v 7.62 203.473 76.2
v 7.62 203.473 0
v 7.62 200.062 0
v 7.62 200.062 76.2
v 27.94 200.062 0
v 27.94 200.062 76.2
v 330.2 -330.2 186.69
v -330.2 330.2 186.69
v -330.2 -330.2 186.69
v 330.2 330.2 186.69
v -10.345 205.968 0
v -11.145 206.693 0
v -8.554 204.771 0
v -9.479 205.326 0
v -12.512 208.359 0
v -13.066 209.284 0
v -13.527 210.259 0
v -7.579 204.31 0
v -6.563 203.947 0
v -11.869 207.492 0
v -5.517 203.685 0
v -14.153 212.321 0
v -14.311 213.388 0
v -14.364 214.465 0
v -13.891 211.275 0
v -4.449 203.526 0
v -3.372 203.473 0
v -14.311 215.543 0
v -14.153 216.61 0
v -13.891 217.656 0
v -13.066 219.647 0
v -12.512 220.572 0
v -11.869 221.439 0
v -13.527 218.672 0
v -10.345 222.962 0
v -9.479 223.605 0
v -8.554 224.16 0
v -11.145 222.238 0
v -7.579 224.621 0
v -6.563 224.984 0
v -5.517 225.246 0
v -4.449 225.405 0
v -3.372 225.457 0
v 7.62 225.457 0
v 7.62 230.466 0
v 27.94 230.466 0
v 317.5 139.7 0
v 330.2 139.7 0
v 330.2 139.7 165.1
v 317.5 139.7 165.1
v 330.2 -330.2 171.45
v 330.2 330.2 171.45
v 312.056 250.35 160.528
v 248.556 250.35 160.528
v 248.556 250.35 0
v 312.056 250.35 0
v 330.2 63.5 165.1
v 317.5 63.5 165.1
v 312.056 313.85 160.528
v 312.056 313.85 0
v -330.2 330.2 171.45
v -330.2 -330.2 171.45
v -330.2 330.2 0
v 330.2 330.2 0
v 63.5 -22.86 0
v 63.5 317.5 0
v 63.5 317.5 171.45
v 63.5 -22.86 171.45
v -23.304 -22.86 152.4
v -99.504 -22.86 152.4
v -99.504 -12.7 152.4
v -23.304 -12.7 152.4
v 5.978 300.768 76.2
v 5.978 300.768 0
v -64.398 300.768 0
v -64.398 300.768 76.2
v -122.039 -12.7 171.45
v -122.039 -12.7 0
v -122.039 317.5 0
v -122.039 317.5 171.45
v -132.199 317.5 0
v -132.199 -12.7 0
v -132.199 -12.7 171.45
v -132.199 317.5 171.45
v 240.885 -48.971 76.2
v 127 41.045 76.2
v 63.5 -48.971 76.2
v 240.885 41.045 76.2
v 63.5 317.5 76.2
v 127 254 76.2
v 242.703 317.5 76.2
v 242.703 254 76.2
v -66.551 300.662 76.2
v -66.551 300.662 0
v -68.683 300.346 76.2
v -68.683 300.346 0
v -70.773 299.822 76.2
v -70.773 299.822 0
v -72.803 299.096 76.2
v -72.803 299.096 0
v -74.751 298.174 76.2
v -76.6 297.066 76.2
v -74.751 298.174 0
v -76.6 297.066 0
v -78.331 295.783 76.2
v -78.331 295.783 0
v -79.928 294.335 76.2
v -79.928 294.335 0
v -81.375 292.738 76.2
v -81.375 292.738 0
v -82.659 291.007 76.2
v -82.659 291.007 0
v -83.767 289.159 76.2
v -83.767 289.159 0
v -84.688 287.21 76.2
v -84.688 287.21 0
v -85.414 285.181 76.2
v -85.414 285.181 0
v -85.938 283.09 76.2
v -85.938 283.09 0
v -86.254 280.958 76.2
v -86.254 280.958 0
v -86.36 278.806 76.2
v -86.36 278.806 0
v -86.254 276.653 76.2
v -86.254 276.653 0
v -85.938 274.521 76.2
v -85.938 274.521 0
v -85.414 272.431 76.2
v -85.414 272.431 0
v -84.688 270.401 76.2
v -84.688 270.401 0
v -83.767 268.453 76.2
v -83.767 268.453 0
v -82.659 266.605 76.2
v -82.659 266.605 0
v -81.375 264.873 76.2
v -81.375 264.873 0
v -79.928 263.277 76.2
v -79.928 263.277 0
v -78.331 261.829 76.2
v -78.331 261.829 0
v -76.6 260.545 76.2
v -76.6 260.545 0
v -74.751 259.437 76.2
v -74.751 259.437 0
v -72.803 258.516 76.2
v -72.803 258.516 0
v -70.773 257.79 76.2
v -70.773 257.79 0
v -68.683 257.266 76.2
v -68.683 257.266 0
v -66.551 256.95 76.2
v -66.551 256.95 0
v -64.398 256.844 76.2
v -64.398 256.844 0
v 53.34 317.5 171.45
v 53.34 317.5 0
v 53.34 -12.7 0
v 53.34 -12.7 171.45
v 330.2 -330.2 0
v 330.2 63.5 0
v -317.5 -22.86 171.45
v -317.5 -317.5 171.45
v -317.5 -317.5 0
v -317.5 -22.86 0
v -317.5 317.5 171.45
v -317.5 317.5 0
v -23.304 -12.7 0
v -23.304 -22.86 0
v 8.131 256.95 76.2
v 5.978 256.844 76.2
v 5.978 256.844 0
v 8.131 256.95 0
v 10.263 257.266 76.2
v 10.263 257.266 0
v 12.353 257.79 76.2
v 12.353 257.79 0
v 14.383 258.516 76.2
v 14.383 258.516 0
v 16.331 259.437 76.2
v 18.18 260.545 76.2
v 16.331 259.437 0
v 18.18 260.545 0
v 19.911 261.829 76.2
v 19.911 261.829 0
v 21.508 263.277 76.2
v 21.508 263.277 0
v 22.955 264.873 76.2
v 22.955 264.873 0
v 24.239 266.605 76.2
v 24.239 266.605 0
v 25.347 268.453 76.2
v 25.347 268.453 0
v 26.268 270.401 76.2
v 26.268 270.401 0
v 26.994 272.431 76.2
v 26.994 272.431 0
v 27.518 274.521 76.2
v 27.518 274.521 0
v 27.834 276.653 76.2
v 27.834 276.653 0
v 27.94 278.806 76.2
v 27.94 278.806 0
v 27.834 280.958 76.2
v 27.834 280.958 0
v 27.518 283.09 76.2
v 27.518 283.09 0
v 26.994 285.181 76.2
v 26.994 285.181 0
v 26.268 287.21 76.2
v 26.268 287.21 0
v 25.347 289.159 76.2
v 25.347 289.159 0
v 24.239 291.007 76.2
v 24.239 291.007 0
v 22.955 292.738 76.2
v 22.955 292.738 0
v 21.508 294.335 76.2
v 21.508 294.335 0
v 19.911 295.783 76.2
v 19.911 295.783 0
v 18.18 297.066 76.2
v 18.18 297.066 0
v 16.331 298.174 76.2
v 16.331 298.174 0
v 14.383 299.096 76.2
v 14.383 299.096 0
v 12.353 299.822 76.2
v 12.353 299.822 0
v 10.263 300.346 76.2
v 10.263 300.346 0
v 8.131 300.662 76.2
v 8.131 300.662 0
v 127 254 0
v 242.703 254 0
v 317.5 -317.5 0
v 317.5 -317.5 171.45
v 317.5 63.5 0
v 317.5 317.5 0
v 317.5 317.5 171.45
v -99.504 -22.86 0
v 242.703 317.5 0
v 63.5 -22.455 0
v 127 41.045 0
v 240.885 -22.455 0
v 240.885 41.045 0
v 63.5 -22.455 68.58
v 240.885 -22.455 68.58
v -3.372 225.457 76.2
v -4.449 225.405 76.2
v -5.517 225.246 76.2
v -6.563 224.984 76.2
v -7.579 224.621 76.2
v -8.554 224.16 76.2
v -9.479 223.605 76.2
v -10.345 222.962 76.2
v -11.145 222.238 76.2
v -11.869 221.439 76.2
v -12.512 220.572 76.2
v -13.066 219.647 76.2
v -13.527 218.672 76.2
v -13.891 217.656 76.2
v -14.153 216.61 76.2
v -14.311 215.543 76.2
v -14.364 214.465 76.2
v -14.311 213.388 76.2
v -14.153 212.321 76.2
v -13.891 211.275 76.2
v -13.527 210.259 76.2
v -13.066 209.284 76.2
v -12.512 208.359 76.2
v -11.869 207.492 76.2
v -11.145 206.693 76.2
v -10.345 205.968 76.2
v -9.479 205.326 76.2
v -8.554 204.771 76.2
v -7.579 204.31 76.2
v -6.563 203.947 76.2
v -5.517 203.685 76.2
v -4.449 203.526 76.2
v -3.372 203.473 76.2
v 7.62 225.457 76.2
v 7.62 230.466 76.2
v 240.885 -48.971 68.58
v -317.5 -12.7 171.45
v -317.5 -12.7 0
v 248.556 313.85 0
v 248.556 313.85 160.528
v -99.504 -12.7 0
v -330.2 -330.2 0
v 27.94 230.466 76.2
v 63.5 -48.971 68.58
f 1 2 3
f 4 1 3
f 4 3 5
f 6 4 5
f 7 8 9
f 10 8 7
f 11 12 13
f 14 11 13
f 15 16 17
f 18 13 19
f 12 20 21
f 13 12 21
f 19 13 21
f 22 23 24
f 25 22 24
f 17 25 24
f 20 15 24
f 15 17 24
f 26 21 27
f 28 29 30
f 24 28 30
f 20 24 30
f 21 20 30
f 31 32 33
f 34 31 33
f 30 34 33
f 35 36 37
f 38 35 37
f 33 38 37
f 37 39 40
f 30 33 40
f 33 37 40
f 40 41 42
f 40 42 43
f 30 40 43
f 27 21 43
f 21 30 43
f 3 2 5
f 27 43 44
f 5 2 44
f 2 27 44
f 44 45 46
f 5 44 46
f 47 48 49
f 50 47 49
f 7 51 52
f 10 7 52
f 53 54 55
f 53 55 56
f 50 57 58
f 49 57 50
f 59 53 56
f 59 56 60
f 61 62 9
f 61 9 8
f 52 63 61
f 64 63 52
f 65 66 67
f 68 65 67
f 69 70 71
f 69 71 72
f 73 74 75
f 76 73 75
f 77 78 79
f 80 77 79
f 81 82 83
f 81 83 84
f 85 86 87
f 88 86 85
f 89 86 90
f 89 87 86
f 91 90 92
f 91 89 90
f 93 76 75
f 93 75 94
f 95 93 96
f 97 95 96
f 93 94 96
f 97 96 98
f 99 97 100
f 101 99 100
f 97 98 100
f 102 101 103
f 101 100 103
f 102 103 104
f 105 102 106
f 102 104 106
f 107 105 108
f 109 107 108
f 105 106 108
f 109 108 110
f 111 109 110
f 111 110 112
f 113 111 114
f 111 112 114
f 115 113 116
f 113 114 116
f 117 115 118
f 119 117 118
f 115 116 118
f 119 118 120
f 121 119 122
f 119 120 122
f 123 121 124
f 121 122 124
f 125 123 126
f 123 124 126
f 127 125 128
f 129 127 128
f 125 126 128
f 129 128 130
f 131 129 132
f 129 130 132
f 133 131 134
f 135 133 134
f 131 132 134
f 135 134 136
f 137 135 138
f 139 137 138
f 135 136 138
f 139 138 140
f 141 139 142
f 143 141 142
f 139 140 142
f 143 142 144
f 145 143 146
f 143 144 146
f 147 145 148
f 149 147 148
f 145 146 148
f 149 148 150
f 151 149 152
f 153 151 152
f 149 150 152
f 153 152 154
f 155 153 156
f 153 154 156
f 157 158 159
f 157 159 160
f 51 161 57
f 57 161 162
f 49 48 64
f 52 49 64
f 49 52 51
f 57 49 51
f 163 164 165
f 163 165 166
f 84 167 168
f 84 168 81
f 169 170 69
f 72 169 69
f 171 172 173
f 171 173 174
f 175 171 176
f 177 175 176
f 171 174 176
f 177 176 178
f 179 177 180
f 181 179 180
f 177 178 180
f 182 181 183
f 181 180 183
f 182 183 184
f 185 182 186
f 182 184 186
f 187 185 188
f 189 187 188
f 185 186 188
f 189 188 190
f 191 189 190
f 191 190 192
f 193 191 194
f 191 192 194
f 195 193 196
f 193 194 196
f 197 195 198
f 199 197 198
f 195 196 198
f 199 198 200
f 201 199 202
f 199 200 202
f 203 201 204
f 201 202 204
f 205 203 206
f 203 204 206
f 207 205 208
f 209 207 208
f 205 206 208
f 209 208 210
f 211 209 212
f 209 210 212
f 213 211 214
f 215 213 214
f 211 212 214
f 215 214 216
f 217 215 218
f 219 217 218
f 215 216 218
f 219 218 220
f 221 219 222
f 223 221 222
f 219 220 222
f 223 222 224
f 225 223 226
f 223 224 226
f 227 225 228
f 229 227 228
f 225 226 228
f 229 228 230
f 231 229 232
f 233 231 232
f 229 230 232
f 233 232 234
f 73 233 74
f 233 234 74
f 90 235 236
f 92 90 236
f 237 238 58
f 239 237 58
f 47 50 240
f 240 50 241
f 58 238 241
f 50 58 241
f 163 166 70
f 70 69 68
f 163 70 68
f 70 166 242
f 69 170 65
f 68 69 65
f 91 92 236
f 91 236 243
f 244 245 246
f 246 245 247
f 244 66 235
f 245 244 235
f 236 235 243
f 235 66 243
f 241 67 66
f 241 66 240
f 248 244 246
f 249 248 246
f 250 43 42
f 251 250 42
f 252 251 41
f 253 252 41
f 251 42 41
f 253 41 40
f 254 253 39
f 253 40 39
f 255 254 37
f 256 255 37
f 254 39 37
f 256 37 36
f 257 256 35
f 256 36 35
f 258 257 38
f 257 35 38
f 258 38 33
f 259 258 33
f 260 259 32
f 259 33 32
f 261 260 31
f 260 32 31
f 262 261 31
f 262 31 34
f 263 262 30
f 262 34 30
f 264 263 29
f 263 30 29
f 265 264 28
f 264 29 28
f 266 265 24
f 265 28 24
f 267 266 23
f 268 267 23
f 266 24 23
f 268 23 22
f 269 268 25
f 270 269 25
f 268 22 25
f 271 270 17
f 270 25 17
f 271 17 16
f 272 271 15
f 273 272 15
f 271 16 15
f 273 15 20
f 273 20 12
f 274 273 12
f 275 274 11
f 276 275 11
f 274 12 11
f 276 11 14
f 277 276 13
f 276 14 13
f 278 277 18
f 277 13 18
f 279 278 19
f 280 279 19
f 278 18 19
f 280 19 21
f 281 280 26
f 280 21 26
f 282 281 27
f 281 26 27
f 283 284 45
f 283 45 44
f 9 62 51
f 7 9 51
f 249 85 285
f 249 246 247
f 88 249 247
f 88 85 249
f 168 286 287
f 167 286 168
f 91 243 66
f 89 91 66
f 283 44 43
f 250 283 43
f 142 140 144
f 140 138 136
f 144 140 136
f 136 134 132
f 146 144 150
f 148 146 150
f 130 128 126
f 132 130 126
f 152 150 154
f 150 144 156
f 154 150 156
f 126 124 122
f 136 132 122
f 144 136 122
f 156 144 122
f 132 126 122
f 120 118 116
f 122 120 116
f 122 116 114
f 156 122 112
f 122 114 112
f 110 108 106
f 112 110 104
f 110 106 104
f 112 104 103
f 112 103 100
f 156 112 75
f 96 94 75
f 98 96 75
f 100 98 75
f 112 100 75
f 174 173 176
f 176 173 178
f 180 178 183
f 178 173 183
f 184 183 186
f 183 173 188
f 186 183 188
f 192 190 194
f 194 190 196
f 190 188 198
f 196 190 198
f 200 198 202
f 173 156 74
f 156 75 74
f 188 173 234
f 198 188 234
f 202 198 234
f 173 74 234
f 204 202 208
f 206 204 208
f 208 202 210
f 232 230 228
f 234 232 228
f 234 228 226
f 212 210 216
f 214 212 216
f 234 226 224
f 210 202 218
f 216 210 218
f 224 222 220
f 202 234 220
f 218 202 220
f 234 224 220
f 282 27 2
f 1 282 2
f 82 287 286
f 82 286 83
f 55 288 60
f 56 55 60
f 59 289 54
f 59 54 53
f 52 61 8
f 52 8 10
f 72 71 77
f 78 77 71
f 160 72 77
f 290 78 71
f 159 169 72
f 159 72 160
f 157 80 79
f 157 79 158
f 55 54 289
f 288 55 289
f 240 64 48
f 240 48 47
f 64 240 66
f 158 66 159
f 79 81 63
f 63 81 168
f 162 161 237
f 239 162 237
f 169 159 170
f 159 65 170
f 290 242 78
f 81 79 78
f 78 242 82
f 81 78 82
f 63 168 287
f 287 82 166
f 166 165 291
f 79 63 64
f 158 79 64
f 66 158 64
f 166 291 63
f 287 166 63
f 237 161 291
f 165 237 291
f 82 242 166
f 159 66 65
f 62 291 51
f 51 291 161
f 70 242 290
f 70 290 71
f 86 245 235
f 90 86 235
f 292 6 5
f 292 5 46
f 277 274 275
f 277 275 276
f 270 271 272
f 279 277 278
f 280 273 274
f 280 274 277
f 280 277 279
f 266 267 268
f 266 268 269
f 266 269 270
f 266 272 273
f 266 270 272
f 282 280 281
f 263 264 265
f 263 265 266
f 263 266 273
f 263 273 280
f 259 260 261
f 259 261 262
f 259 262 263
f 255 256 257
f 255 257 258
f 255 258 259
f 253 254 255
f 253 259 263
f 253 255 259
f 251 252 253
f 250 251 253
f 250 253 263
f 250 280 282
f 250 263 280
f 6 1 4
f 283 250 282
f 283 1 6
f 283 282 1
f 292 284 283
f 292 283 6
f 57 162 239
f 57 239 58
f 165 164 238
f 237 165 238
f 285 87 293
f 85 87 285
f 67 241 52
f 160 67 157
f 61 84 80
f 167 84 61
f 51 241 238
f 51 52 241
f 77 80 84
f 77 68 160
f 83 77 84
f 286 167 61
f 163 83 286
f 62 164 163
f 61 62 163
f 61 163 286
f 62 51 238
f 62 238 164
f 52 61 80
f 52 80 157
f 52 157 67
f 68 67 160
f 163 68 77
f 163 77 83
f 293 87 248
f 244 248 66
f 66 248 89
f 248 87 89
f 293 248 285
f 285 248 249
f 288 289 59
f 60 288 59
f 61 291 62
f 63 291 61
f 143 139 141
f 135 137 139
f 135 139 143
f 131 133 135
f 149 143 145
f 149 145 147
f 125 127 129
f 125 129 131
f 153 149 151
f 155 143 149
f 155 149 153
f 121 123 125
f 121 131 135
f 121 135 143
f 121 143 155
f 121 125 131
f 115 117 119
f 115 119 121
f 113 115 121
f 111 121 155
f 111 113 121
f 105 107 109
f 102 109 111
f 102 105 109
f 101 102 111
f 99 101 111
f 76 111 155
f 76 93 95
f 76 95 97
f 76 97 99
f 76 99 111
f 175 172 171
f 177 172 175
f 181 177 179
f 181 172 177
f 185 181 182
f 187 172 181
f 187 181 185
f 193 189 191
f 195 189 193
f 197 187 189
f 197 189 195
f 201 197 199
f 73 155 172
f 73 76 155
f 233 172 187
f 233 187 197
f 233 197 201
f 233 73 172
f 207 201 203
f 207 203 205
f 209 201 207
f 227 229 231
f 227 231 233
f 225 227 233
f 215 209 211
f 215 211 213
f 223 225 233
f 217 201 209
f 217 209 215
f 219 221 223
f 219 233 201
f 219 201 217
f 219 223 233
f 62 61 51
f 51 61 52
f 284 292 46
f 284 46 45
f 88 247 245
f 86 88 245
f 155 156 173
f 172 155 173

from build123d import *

# Parameters (mm, degrees)
F0_W      = 660.4
F0_H      = 660.4
F1_DEPTH  = 171.45
F3_W      = 635
F3_H      = 635
F4_DEPTH  = 251.46
F5_W      = 76.2
F5_H      = 165.1
F6_DEPTH  = 12.7
F7_W      = 635
F7_H      = 10.16
F8_DEPTH  = 171.45
F9_W      = 254
F9_H      = 171.45
F10_DEPTH = 10.16
F11_W     = 660.4
F11_H     = 660.4
F12_DEPTH = 15.24
F14_DEPTH = 76.2
F15_W     = 76.2
F15_H     = 152.4
F16_DEPTH = 10.16
F17_W     = 10.16
F17_H     = 171.45
F18_DEPTH = 330.2
F20_DEPTH = 76.2
F21_W     = 63.5
F21_H     = 63.5
F22_DEPTH = 160.528
F23_W     = 10.16
F23_H     = 330.2
F24_DEPTH = 171.45
F25_W     = 177.385084331
F25_H     = 54.4112967327
F26_DEPTH = 7.62


with BuildPart() as f1:
    # F0 (on Top) → F1 (new body)
    with BuildSketch(Plane.XY):
        Rectangle(F0_W, F0_H)
    extrude(amount=F1_DEPTH)

    # F3 (on face) → F4 (cut)
    with BuildSketch(Plane.XY.offset(171.45)):
        Rectangle(F3_W, F3_H)
    extrude(amount=-F4_DEPTH, mode=Mode.SUBTRACT)

    # F5 (on face) → F6 (cut, through all)
    with BuildSketch(Plane.YZ.offset(330.2)):
        with Locations((101.6, 82.55)):
            Rectangle(F5_W, F5_H)
    extrude(amount=-F6_DEPTH, mode=Mode.SUBTRACT)

    # F7 (on face) → F8 (join, through all)
    with BuildSketch(Plane.XY):
        with Locations((0, -17.78)):
            Rectangle(F7_W, F7_H)
    extrude(amount=F8_DEPTH)

    # F9 (on face) → F10 (cut, through all)
    with BuildSketch(Plane.XZ.offset(22.86)):
        with Locations((190.5, 85.725)):
            Rectangle(F9_W, F9_H)
    extrude(amount=-F10_DEPTH, mode=Mode.SUBTRACT)

    # F15 (on face) → F16 (cut, through all)
    with BuildSketch(Plane.XZ.offset(22.86)):
        with Locations((-61.403836852, 76.2)):
            Rectangle(F15_W, F15_H)
    extrude(amount=-F16_DEPTH, mode=Mode.SUBTRACT)

    # F17 (on face) → F18 (join, through all)
    with BuildSketch(Plane(origin=(0, -12.7, 0), x_dir=(-1, 0, 0), z_dir=(0, 1, 0))):
        with Locations((-58.42, 85.725)):
            Rectangle(F17_W, F17_H)
    extrude(amount=F18_DEPTH)

    # F23 (on face) → F24 (join, through all)
    with BuildSketch(Plane.XY):
        with Locations((-127.1187807751, 152.4)):
            Rectangle(F23_W, F23_H)
    extrude(amount=F24_DEPTH)


with BuildPart() as f12:
    # F11 (on face) → F12 (new body)
    with BuildSketch(Plane.XY.offset(171.45)):
        Rectangle(F11_W, F11_H)
    extrude(amount=F12_DEPTH)


with BuildPart() as f14:
    # F13 (on face) → F14 (new body)
    with BuildSketch(Plane.XY):
        with BuildLine():
            Line((5.9782206564, 300.767604221), (-64.3982206564, 300.767604221))
            ThreePointArc((-64.3982206564, 300.767604221), (-86.36, 278.8058248774), (-64.3982206564, 256.8440455338))
            Line((-64.3982206564, 256.8440455338), (5.9782206564, 256.8440455338))
            ThreePointArc((5.9782206564, 256.8440455338), (27.94, 278.8058248774), (5.9782206564, 300.767604221))
        make_face()
    extrude(amount=F14_DEPTH)


with BuildPart() as f14b:
    # F13 (on face) → F14, piece 2 (new body)
    with BuildSketch(Plane.XY):
        Polygon((27.94, 200.0615537474), (27.94, 230.4656018443), (7.62, 230.4656018443), (7.62, 225.4574813614), (7.62, 203.4733542914), (7.62, 200.0615537474), align=None)
        with BuildLine():
            Line((7.62, 203.4733542914), (7.62, 225.4574813614))
            Line((7.62, 225.4574813614), (-3.372063535, 225.4574813614))
            ThreePointArc((-3.372063535, 225.4574813614), (-14.36412707, 214.4654178264), (-3.372063535, 203.4733542914))
            Line((-3.372063535, 203.4733542914), (7.62, 203.4733542914))
        make_face()
    extrude(amount=F14_DEPTH)


with BuildPart() as f20:
    # F19 (on face) → F20 (new body)
    with BuildSketch(Plane.XY):
        Polygon((127, 317.5), (63.5, 317.5), (63.5, 254), (63.5, 41.0446626544), (63.5, -22.4553373456), (127, -22.4553373456), (240.885084331, -22.4553373456), (240.885084331, 41.0446626544), (127, 41.0446626544), (127, 254), (242.7029758692, 254), (242.7029758692, 317.5), align=None)
    extrude(amount=F20_DEPTH)

    # F25 (on face) → F26 (join)
    with BuildSketch(Plane.XY.offset(76.2)):
        with Locations((152.1925421655, -21.7650732957)):
            Rectangle(F25_W, F25_H)
    extrude(amount=-F26_DEPTH)


with BuildPart() as f22:
    # F21 (on face) → F22 (new body)
    with BuildSketch(Plane.XY):
        with Locations((280.3060774803, 282.0997173786)):
            Rectangle(F21_W, F21_H)
    extrude(amount=F22_DEPTH)


solid = Compound([f1.part, f12.part, f14.part, f14b.part, f20.part, f22.part])
